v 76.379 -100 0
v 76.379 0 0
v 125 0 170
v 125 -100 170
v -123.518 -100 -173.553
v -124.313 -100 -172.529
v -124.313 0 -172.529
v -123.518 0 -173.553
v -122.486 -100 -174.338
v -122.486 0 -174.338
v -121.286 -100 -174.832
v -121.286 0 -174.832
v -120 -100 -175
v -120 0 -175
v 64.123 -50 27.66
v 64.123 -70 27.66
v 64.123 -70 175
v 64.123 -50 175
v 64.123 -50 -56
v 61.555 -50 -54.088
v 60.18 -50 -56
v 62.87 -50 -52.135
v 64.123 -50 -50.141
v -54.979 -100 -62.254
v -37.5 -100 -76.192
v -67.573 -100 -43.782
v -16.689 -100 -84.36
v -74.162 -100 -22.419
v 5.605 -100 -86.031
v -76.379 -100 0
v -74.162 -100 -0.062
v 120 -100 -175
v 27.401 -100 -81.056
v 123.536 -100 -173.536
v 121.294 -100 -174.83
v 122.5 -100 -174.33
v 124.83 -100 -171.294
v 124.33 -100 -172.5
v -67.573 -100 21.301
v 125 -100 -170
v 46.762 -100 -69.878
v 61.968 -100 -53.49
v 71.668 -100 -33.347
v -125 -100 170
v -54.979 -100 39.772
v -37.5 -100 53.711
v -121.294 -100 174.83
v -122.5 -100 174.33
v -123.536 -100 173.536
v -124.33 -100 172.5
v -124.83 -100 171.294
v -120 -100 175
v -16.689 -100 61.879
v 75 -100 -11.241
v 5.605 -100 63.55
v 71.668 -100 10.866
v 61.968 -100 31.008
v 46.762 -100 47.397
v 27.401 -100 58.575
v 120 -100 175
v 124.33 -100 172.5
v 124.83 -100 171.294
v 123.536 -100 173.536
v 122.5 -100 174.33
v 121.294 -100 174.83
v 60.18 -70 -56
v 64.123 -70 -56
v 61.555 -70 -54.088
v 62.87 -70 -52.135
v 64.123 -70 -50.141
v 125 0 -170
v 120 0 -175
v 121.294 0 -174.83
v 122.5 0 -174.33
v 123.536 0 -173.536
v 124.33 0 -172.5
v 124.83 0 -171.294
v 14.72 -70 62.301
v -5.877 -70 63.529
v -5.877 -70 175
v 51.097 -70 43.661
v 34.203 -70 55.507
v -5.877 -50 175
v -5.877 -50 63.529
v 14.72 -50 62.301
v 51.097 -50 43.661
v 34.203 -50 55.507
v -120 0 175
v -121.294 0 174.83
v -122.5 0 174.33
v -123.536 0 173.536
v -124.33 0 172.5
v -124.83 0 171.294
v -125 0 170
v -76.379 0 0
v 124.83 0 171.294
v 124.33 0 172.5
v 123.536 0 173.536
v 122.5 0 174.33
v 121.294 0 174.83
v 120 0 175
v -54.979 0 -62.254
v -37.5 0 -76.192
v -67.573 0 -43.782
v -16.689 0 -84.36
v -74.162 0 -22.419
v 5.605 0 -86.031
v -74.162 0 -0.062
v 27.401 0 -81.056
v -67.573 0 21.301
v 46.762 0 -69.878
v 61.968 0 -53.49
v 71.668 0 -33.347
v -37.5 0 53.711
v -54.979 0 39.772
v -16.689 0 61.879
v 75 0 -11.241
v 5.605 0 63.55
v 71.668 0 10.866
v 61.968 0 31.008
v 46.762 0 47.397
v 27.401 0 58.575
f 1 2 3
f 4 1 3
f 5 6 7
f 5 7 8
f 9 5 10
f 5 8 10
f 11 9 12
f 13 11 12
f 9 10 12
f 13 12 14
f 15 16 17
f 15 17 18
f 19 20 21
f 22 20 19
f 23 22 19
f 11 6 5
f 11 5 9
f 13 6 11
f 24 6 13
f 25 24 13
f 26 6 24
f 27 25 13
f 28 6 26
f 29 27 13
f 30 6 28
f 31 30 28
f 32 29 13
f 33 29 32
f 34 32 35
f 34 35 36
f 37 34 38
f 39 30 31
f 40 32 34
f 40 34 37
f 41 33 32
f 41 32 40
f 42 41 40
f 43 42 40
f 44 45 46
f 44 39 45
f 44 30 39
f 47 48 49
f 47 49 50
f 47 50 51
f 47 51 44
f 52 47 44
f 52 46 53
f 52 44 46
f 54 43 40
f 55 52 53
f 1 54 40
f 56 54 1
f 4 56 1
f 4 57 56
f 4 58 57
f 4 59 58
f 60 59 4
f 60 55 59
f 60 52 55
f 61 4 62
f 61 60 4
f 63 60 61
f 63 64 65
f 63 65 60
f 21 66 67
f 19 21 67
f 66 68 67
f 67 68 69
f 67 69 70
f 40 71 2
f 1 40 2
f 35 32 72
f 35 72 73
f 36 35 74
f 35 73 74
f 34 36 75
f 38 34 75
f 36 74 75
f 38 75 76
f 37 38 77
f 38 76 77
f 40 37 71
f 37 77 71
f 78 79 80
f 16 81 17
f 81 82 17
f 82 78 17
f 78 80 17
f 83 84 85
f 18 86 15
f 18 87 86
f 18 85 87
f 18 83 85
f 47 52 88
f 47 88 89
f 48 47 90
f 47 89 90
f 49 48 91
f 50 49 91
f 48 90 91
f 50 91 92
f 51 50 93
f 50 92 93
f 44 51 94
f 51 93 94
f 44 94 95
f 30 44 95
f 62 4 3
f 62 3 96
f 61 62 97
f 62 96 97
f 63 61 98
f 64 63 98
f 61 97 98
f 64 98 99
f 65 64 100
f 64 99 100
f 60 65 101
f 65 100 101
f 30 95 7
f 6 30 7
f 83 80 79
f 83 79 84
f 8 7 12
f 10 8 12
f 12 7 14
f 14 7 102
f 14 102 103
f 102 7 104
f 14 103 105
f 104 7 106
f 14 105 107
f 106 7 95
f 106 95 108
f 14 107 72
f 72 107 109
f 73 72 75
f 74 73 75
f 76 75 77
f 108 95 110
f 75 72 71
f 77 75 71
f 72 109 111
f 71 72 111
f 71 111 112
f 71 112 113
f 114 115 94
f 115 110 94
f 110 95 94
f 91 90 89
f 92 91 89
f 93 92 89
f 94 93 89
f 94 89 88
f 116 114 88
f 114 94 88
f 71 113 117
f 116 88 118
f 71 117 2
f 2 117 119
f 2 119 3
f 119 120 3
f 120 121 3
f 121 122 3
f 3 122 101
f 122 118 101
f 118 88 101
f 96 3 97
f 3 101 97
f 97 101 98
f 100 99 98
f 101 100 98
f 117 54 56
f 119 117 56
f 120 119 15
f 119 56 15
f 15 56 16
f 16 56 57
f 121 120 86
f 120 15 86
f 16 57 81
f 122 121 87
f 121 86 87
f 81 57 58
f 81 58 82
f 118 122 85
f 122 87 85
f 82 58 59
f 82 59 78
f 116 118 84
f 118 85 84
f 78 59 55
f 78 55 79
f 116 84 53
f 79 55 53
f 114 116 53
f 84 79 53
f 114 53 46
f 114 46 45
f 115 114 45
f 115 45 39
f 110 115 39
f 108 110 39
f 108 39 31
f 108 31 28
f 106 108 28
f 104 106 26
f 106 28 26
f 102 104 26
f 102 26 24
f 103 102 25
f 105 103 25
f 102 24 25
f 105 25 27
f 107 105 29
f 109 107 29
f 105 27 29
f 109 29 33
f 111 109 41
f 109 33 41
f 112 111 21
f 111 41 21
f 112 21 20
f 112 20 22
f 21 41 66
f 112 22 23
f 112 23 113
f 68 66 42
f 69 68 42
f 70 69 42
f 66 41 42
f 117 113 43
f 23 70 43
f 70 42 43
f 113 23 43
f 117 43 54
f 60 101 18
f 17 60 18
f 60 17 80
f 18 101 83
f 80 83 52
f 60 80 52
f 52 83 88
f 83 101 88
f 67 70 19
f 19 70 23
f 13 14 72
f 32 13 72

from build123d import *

# Parameters (mm, degrees)
F1_DEPTH = 100
F2_R     = 75
F3_DEPTH = 267
F4_W     = 70
F4_H     = 20
F5_DEPTH = 231


with BuildPart() as f1:
    # F0 (on Front) → F1 (new body)
    with BuildSketch(Plane.XZ):
        with BuildLine():
            Line((120, 175), (-120, 175))
            ThreePointArc((-120, 175), (-123.535534, 173.535534), (-125, 170))
            Line((-125, 170), (-76.379128, 0))
            Line((-76.379128, 0), (-124.313403, -172.528746))
            ThreePointArc((-124.313403, -172.528746), (-122.485585, -174.338417), (-120, -175))
            Line((-120, -175), (120, -175))
            ThreePointArc((120, -175), (123.535534, -173.535534), (125, -170))
            Line((125, -170), (76.379128, 0))
            Line((76.379128, 0), (125, 170))
            ThreePointArc((125, 170), (123.535534, 173.535534), (120, 175))
        make_face()
    extrude(amount=F1_DEPTH)

    # F2 (on face) → F3 (cut)
    with BuildSketch(Plane.XZ.offset(100)):
        with Locations((0, -11.24055)):
            Circle(F2_R)
    extrude(amount=-F3_DEPTH, mode=Mode.SUBTRACT)

    # F4 (on face) → F5 (cut)
    with BuildSketch(Plane.XY.offset(175)):
        with Locations((29.123203, -60)):
            Rectangle(F4_W, F4_H)
    extrude(amount=-F5_DEPTH, mode=Mode.SUBTRACT)


solid = f1.part
